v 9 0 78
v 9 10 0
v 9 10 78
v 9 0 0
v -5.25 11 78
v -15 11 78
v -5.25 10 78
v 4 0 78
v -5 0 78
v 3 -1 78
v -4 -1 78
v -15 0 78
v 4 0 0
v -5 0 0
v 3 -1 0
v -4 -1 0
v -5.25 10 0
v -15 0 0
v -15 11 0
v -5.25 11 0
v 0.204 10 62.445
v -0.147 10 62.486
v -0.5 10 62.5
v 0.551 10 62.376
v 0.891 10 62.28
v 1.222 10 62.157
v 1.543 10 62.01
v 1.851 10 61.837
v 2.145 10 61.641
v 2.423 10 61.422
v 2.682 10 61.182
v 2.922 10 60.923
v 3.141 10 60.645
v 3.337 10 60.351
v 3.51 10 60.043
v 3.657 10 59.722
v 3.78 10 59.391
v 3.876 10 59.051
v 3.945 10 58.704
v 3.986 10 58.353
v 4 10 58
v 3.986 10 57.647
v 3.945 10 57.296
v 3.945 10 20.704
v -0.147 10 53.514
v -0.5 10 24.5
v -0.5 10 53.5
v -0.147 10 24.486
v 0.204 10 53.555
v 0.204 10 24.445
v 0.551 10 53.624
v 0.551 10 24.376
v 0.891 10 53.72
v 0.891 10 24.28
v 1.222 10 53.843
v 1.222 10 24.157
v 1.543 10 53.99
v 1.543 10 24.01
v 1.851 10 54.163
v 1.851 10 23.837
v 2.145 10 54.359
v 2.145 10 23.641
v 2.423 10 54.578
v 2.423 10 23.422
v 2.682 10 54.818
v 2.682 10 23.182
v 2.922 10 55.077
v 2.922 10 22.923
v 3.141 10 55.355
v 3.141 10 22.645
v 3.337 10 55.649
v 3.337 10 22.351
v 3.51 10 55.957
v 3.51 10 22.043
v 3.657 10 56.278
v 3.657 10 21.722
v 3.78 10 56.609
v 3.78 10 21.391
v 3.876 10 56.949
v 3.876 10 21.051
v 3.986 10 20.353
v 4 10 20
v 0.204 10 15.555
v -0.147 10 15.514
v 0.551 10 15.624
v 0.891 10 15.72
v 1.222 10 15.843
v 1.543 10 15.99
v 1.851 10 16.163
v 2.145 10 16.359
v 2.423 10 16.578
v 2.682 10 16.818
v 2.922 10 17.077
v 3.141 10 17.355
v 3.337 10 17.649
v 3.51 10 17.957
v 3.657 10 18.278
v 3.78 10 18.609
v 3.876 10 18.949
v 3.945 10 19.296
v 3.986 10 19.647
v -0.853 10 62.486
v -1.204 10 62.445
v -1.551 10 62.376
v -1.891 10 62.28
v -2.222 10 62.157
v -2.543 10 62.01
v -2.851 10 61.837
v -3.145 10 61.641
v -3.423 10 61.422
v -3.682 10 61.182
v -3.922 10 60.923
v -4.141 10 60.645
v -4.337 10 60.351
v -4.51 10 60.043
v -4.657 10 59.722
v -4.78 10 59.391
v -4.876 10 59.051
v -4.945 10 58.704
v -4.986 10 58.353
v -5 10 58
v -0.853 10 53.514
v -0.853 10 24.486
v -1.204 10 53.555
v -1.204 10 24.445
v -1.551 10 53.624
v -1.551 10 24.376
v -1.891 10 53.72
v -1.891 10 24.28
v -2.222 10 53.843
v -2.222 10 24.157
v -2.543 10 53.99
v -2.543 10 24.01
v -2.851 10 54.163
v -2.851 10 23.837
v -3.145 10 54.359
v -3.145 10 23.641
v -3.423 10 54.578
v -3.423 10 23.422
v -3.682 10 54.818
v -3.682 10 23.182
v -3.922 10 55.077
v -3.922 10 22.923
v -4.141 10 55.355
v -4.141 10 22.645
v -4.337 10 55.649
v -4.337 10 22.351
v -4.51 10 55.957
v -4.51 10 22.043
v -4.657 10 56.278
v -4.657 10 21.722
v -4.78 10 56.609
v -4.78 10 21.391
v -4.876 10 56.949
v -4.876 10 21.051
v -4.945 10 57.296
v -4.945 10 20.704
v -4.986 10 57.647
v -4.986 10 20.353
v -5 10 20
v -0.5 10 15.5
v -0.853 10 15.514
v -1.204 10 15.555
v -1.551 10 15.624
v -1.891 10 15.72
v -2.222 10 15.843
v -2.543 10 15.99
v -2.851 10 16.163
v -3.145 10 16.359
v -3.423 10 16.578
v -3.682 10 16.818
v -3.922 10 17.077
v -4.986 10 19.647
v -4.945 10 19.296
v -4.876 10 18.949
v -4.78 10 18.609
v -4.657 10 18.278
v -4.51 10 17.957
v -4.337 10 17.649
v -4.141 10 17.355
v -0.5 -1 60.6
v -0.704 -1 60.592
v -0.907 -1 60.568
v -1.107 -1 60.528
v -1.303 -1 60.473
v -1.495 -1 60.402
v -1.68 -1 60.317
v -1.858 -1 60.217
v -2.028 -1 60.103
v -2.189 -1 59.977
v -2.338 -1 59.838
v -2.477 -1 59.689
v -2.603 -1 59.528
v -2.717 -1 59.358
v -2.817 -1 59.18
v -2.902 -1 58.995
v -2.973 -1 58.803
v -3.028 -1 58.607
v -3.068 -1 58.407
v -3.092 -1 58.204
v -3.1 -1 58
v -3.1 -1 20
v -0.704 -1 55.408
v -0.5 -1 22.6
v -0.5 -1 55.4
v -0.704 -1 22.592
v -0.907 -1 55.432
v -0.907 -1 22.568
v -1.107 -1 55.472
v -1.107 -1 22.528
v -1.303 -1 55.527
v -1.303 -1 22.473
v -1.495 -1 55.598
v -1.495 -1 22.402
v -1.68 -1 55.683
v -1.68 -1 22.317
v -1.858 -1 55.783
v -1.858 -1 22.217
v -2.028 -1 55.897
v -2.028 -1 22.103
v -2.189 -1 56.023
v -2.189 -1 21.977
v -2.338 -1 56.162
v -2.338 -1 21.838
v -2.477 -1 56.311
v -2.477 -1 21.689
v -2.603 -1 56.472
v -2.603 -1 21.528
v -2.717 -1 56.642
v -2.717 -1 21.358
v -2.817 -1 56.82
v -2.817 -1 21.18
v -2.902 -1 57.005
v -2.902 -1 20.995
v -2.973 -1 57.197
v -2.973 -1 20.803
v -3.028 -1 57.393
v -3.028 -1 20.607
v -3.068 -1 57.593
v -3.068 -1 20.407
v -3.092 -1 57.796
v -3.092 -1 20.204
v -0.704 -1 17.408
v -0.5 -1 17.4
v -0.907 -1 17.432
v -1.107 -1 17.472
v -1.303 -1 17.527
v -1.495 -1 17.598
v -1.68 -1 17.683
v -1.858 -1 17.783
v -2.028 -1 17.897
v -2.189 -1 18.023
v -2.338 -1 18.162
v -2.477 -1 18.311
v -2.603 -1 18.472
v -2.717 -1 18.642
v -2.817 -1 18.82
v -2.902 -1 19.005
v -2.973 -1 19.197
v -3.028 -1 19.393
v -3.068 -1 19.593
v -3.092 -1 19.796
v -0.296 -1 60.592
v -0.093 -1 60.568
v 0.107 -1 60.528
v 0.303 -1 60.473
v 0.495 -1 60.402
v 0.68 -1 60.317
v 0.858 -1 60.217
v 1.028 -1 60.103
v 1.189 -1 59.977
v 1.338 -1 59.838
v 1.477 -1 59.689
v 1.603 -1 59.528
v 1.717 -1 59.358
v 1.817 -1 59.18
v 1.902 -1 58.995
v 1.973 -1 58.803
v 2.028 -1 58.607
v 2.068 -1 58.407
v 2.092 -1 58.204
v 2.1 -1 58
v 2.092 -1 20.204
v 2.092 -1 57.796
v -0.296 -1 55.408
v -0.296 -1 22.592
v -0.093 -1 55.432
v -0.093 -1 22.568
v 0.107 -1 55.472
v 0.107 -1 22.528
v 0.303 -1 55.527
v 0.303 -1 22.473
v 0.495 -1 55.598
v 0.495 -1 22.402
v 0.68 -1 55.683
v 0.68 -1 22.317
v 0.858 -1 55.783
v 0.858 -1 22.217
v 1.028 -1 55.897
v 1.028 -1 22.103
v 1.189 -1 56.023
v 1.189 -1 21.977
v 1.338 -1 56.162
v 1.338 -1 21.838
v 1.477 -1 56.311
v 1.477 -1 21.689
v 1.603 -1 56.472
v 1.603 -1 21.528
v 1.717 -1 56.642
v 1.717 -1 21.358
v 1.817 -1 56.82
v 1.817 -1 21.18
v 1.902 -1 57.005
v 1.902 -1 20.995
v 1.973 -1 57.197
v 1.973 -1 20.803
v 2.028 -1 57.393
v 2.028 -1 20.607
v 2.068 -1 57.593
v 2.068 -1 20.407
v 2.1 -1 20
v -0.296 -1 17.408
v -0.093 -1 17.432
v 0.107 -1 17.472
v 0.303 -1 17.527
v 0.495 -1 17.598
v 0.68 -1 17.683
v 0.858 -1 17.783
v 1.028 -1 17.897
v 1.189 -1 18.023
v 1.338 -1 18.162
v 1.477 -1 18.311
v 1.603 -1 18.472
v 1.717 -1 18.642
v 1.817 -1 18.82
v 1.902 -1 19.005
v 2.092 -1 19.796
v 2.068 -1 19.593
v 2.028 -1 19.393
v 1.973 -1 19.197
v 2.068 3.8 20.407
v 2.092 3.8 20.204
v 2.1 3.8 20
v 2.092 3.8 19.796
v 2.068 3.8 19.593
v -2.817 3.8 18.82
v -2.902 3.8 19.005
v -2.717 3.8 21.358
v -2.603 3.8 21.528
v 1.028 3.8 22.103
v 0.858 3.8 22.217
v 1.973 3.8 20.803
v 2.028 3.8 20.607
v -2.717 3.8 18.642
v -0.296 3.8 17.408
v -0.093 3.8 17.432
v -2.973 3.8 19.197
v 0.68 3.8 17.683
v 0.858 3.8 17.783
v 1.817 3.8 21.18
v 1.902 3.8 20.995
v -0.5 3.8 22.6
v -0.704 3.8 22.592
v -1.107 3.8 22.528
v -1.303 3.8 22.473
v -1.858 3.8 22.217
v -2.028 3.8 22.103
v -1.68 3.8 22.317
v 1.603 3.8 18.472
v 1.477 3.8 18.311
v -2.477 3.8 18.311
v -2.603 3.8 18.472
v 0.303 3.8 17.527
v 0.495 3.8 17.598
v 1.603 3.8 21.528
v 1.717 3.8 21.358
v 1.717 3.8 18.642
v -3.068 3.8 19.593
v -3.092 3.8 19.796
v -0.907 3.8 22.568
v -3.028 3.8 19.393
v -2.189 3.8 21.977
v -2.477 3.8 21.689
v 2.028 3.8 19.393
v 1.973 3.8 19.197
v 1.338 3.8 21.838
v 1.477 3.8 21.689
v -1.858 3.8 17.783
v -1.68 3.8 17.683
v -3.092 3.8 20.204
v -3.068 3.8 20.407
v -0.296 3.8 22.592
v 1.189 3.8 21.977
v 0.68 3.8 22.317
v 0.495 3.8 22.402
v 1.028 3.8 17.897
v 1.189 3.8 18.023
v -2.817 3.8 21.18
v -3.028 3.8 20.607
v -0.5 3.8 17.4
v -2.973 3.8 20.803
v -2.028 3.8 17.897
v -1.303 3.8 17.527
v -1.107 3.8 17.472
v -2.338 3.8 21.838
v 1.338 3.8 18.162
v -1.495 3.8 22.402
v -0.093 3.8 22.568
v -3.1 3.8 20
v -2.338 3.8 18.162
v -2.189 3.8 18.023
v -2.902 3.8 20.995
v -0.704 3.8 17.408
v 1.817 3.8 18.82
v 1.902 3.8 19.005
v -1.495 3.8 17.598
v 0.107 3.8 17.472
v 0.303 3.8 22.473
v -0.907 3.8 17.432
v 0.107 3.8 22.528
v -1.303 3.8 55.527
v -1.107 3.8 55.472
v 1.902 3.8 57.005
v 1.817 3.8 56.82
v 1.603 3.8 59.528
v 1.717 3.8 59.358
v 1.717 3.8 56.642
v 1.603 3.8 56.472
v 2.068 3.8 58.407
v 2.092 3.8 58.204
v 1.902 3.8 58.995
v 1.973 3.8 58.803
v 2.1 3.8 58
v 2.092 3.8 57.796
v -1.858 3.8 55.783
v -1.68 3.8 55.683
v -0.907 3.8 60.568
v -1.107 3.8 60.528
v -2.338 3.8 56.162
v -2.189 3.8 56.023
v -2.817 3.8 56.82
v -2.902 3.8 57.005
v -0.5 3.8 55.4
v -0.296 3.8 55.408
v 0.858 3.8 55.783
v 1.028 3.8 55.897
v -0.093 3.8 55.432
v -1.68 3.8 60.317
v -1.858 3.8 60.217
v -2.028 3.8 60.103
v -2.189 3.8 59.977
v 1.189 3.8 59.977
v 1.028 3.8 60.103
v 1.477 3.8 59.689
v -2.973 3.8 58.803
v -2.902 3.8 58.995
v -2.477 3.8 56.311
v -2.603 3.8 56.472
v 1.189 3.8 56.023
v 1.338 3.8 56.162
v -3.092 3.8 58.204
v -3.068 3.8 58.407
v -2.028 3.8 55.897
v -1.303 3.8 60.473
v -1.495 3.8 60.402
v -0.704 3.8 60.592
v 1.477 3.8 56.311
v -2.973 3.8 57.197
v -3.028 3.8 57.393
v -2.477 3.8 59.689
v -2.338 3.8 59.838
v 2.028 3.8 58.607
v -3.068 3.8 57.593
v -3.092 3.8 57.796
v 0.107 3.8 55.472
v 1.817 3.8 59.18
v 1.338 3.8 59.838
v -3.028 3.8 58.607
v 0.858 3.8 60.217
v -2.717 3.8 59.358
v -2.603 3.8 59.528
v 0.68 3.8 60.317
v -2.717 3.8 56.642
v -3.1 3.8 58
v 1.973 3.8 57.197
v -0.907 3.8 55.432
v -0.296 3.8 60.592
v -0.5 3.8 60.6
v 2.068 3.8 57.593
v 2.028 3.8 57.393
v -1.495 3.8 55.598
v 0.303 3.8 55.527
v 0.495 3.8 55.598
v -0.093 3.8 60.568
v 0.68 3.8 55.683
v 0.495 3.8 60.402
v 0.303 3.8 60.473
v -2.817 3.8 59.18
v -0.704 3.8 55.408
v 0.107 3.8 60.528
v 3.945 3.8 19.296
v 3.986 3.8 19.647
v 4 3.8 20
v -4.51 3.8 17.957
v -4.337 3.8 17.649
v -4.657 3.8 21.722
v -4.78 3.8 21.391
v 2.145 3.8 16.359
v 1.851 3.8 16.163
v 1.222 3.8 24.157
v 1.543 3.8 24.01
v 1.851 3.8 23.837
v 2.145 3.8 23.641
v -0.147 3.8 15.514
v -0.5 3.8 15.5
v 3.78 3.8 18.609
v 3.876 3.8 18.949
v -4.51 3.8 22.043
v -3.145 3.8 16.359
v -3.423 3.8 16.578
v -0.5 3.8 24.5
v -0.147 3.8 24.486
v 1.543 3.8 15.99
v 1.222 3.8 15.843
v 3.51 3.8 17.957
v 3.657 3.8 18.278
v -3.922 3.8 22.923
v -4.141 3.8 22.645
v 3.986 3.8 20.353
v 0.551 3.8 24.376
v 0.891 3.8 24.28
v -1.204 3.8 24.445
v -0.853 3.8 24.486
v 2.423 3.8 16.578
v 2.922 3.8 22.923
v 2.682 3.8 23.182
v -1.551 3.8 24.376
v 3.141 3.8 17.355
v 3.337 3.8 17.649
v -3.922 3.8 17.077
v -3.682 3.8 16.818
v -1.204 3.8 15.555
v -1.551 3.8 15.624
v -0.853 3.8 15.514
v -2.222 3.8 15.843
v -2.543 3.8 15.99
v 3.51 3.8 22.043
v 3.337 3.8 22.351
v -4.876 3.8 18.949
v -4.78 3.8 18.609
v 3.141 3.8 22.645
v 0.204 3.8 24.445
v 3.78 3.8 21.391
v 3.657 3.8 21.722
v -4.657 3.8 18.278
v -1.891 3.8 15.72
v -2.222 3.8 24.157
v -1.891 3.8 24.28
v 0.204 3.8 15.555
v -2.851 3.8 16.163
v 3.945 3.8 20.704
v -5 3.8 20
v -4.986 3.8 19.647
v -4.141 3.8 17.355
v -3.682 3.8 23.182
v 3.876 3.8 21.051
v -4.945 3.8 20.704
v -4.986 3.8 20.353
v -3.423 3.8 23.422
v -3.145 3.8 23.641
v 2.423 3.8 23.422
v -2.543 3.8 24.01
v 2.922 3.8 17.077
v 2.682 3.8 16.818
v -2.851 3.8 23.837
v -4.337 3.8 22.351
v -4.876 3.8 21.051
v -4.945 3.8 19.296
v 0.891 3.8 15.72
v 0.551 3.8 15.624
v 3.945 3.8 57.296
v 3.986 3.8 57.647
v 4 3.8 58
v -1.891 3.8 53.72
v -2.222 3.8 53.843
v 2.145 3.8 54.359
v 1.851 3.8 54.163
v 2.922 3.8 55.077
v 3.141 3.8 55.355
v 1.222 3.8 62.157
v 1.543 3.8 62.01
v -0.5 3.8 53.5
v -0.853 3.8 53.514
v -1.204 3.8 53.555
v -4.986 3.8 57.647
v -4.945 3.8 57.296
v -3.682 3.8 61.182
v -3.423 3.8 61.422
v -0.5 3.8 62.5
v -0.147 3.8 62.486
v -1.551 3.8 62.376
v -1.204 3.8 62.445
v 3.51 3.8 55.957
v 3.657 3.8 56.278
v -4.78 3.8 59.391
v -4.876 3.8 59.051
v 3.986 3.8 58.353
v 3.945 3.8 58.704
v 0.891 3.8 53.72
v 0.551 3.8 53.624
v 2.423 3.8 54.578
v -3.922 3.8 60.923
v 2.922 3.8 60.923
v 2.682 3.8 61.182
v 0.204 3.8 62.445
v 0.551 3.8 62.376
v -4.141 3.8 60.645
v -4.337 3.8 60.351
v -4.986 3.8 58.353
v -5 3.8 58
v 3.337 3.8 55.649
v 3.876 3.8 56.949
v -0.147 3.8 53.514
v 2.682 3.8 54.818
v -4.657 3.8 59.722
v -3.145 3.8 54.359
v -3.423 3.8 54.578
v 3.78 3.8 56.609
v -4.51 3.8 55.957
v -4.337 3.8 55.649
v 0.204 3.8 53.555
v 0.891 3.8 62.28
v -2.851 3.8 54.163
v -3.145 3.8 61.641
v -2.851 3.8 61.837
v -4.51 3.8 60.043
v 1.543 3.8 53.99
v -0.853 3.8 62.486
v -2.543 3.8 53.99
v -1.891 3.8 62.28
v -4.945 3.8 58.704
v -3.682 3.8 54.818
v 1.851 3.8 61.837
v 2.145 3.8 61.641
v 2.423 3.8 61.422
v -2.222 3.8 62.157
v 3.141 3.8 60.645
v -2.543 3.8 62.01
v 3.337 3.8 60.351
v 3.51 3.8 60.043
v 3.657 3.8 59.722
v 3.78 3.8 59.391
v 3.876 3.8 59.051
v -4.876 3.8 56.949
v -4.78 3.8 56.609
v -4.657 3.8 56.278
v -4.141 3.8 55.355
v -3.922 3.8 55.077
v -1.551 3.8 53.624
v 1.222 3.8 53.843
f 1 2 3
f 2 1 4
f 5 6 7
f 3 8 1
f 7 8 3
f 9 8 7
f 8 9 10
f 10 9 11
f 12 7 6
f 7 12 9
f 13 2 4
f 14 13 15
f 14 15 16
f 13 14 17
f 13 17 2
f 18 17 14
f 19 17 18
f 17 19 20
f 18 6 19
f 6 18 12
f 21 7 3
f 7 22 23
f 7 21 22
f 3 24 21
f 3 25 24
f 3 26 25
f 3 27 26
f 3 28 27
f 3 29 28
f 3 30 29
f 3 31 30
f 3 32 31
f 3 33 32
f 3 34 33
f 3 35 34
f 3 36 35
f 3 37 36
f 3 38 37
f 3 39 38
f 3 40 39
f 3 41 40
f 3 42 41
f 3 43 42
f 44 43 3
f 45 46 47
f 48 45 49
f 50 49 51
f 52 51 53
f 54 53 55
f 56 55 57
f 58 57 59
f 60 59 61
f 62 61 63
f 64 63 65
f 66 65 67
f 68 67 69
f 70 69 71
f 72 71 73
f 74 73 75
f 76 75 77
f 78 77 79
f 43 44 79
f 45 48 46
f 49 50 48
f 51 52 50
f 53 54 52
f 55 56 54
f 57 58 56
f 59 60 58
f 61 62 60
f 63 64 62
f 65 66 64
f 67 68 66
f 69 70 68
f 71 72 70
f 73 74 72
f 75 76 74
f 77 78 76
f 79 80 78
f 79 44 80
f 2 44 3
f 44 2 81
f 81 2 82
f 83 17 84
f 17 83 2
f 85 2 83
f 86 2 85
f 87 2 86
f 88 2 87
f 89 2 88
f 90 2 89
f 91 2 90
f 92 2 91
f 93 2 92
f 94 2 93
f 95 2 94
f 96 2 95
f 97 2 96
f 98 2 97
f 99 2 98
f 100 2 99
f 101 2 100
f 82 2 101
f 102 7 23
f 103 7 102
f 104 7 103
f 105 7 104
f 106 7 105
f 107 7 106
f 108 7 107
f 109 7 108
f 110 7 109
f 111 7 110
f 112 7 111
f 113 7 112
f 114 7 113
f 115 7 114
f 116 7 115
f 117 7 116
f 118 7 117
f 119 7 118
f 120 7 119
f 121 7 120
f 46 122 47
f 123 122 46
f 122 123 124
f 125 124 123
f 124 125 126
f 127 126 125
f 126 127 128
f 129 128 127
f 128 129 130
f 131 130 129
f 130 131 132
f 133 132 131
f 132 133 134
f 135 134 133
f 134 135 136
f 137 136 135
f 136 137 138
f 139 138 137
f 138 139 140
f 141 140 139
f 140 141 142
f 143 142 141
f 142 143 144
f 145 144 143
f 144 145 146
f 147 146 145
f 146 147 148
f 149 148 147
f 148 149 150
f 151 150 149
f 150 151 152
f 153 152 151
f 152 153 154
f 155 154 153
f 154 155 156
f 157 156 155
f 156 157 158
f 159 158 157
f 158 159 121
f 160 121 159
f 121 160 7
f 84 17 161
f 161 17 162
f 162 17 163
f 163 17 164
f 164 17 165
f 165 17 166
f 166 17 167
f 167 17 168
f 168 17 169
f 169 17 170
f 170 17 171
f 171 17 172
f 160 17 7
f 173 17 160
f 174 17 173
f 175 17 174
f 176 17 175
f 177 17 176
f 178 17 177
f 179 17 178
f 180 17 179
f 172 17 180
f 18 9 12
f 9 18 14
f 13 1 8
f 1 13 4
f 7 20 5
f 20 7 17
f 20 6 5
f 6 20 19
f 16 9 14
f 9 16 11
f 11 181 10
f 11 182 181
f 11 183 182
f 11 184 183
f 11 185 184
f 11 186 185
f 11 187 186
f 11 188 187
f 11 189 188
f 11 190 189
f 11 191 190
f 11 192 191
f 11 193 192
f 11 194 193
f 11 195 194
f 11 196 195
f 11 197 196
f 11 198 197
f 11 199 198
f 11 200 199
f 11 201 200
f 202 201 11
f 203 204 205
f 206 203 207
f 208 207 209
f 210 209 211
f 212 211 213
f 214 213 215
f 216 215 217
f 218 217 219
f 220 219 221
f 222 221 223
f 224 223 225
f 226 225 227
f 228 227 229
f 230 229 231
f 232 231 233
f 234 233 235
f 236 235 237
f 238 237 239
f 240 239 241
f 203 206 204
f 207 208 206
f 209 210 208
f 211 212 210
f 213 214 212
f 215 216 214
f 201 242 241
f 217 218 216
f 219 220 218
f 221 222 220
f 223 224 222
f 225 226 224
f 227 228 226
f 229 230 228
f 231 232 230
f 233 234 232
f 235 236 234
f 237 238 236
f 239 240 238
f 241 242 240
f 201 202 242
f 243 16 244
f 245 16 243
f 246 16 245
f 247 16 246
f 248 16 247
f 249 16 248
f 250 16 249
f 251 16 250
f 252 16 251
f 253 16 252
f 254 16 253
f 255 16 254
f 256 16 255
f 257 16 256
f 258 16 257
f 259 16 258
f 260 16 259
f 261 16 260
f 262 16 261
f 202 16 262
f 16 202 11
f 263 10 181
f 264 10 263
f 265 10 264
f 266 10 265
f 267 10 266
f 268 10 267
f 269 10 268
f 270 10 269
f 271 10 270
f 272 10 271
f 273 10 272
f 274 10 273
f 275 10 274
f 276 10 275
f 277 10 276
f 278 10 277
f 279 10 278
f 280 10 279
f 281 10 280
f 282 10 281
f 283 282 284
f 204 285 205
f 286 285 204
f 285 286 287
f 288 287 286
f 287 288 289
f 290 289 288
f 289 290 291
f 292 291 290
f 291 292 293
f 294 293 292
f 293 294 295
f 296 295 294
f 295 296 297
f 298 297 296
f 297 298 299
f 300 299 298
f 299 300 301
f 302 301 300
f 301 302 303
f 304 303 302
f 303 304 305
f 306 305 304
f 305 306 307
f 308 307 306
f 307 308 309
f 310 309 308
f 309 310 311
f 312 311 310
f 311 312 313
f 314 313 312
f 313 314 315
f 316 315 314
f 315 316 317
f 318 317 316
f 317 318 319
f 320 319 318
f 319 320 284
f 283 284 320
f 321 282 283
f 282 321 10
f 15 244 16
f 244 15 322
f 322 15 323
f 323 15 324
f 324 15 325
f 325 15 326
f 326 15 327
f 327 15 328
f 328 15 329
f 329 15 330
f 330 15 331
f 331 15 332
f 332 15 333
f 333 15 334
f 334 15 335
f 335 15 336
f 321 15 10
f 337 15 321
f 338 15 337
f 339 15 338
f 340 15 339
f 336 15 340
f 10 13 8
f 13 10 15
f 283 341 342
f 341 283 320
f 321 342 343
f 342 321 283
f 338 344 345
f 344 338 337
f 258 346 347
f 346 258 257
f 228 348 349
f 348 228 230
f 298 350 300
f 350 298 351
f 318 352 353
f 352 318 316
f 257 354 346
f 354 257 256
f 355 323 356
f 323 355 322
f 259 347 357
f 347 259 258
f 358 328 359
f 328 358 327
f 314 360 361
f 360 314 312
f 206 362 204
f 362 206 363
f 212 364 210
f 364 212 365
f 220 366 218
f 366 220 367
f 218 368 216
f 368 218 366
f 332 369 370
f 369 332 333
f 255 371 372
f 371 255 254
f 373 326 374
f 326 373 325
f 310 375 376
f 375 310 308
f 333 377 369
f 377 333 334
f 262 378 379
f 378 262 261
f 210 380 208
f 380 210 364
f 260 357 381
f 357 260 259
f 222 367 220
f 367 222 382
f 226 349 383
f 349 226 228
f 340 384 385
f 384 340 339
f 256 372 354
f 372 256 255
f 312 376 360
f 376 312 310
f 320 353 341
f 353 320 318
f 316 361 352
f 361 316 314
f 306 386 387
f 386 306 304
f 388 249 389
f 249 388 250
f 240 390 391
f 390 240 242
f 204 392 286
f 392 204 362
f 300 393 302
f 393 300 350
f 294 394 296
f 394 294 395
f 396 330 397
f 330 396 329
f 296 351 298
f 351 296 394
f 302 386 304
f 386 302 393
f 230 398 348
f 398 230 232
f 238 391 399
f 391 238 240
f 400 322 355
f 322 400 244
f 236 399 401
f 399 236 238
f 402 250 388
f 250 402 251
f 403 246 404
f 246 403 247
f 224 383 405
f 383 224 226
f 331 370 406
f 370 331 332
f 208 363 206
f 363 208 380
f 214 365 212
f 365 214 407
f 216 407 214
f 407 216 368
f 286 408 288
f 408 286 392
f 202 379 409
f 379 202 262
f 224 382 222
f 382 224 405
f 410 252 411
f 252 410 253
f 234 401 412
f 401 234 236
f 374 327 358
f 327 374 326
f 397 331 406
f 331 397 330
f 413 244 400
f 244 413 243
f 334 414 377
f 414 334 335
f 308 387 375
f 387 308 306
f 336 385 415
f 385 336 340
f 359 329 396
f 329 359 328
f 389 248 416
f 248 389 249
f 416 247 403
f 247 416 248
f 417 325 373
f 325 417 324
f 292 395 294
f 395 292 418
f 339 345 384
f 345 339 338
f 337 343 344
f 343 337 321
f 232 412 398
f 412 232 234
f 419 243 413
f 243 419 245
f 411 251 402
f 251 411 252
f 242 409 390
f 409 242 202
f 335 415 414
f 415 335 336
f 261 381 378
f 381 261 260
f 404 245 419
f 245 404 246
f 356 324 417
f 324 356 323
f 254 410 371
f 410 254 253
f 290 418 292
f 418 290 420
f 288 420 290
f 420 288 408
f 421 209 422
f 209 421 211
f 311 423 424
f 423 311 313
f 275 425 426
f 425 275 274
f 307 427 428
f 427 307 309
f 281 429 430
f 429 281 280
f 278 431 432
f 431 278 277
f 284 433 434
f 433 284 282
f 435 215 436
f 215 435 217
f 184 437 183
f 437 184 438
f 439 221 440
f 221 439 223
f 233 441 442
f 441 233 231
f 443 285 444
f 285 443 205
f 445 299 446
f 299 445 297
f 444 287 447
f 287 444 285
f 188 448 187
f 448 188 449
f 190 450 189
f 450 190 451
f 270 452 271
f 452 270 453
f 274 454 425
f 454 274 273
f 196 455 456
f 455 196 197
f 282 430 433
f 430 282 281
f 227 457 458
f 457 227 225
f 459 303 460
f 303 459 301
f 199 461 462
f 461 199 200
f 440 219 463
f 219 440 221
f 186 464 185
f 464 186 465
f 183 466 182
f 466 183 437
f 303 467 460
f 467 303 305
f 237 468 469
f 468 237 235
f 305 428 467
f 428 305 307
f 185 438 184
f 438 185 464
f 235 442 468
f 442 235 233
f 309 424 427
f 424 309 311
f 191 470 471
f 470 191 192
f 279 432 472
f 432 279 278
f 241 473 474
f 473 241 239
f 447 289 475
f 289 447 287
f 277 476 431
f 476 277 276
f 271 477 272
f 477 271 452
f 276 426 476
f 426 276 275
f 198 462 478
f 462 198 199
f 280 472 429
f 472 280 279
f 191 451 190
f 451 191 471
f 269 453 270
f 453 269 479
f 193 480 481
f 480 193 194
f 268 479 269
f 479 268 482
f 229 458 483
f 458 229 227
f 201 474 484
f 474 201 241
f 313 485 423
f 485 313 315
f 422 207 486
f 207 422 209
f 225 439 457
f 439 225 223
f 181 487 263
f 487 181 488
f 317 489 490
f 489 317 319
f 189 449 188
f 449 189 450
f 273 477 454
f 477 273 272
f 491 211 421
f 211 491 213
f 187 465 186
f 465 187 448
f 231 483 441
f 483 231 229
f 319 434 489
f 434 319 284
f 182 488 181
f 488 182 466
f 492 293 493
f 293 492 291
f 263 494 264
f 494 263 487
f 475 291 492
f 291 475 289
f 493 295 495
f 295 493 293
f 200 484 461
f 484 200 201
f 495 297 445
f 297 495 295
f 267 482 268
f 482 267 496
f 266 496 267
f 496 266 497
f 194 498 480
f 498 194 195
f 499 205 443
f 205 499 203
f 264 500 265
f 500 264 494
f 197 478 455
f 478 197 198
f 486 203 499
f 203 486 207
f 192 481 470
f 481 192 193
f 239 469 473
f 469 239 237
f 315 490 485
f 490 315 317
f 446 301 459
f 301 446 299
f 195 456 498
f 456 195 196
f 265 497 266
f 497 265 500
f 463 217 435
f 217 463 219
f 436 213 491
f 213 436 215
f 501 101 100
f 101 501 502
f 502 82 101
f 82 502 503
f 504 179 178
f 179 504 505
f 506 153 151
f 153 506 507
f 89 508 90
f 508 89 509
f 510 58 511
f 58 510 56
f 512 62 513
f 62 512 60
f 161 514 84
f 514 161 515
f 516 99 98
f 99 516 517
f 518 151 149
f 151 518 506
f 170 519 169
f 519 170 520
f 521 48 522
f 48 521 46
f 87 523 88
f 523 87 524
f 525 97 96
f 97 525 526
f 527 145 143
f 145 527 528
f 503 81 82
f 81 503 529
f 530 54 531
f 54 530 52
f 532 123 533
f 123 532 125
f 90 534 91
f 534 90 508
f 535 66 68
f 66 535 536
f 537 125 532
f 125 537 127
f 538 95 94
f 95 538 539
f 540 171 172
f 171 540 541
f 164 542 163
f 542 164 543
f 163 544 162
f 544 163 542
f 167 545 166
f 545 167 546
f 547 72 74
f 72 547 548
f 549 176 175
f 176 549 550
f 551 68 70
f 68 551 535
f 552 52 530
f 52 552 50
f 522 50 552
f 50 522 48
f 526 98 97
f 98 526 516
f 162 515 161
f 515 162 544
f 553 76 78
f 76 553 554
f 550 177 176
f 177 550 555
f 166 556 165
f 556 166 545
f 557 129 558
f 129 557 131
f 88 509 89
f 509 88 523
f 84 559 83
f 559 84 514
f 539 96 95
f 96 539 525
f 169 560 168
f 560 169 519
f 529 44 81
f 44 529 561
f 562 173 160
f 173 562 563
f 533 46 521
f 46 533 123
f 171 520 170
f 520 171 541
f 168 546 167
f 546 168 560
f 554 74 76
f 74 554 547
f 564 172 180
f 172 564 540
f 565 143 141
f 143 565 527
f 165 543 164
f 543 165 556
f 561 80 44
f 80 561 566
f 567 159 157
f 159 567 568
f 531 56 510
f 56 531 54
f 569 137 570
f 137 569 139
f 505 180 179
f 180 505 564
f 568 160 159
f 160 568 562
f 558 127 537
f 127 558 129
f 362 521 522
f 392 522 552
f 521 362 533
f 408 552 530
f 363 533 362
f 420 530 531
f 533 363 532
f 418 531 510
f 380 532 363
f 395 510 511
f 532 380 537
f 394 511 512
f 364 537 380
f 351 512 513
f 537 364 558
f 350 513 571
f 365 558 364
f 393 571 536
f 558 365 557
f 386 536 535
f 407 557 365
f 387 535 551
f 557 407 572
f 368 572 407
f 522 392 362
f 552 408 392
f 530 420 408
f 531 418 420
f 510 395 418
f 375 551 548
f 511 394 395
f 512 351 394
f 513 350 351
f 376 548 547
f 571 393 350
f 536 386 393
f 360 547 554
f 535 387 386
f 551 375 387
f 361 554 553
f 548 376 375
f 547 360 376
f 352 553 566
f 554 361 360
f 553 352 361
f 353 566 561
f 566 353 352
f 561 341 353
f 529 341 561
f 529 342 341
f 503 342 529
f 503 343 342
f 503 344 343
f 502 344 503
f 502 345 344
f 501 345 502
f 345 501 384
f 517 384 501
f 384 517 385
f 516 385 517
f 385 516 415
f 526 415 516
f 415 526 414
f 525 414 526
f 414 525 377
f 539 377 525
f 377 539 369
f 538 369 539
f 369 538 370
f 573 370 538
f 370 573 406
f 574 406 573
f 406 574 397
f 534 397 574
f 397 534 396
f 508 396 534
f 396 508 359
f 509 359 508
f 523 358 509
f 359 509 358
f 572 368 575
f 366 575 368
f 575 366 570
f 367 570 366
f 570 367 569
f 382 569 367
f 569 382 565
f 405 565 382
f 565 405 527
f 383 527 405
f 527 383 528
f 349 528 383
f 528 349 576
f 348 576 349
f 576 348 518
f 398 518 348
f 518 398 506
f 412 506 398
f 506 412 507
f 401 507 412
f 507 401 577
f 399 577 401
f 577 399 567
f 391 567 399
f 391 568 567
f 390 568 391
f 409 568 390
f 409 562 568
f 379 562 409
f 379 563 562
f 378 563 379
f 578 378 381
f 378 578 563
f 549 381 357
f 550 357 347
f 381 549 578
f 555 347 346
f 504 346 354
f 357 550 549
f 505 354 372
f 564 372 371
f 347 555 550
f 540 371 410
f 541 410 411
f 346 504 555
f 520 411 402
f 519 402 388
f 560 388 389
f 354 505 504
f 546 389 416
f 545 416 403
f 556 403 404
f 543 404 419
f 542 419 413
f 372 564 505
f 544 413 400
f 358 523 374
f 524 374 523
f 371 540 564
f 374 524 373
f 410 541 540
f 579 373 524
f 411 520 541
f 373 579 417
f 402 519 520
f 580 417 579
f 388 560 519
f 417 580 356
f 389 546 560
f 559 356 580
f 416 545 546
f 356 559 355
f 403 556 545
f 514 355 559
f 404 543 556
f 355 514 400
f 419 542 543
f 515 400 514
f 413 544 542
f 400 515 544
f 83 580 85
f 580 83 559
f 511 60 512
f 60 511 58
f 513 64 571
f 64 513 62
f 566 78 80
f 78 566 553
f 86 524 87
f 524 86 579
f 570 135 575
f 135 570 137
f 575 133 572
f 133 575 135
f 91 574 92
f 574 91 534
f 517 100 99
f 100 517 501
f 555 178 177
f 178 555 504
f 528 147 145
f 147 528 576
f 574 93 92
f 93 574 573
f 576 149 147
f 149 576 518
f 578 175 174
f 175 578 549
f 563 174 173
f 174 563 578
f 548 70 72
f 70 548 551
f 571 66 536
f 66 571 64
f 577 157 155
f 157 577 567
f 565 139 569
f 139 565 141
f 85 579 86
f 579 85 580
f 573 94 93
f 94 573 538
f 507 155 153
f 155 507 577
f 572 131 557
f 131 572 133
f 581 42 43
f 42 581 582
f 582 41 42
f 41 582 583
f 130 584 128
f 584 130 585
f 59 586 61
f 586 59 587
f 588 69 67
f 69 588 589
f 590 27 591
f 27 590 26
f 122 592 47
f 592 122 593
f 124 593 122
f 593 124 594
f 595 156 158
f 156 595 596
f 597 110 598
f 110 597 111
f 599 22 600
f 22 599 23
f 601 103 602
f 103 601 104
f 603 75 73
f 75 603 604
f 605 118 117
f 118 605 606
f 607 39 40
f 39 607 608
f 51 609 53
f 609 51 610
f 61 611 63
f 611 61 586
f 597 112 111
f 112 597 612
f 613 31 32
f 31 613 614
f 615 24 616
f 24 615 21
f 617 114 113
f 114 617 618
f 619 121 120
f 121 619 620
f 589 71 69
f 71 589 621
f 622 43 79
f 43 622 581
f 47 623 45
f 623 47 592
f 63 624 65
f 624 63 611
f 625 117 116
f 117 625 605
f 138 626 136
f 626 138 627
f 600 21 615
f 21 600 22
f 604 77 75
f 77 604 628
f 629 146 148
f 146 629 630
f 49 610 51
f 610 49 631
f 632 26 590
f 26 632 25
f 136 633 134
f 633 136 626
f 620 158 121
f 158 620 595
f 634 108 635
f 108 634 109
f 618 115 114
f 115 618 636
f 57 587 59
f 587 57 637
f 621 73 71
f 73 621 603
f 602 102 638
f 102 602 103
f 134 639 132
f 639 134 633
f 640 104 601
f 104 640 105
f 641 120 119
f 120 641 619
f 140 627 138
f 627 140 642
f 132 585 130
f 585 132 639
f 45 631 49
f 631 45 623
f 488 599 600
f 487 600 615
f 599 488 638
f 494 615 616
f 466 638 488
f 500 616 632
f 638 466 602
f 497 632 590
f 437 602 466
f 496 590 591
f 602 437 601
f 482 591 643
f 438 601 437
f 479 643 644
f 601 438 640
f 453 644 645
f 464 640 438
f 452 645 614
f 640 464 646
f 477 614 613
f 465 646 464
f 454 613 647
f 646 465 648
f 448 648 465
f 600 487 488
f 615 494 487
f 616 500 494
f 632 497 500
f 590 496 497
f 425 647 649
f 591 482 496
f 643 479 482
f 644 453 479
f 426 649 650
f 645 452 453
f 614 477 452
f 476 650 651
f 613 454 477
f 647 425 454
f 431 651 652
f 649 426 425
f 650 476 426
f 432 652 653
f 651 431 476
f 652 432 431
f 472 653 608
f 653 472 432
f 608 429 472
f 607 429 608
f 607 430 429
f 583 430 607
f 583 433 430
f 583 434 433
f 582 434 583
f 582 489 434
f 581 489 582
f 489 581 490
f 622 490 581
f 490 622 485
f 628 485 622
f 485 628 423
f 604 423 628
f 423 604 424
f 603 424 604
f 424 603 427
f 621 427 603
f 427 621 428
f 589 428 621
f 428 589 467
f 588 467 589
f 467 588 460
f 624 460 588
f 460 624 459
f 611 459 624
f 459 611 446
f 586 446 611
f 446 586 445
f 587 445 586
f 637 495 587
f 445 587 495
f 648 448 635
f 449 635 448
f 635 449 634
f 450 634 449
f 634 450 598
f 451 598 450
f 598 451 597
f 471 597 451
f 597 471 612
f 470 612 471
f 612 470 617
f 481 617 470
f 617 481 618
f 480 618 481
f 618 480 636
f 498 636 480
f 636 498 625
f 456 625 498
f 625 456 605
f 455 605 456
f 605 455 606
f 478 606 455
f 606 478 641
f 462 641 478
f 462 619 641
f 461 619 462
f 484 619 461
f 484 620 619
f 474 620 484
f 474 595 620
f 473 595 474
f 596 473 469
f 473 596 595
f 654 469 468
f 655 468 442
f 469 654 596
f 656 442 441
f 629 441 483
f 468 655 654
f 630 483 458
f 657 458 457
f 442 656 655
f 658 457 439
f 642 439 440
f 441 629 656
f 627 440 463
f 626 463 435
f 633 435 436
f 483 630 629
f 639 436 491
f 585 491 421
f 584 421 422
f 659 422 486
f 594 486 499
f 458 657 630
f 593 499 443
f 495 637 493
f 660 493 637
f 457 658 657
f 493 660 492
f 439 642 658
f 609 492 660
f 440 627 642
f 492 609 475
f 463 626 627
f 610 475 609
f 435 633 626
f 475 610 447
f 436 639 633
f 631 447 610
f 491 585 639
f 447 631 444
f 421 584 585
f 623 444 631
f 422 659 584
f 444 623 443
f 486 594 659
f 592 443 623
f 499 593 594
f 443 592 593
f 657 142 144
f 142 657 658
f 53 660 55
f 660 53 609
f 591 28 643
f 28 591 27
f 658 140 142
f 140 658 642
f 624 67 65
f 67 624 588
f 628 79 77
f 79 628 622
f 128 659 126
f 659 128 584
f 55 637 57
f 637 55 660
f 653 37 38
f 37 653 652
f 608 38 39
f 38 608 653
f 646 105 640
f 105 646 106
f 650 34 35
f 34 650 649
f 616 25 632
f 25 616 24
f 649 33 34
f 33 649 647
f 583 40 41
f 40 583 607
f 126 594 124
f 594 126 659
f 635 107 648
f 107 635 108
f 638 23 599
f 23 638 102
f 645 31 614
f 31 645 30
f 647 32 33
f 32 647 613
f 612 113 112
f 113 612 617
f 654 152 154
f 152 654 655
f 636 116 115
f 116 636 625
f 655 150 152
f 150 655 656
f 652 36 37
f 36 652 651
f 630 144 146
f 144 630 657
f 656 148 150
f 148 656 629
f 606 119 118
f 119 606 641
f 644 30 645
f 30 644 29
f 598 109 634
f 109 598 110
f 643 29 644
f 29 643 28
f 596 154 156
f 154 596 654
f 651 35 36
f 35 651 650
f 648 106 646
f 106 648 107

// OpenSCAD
$fn=80;

// 4.8 mm deep hole for using an 8mm bolt

difference() {
   union() {
      translate([-15,0,0]) cube([24,10,78]);
      translate([-15,0,0]) cube([9.75,11,78]);
      translate([4,0,0]) rotate([0,0,180])
         linear_extrude(height=78)
         polygon(points=[[-0.1,0],[0,0],[1,1],[8,1],[9,0],[9,-0.1]]);
   }

   bolts();
}

module bolts() {
   union() {
         /* bolt holes */
         translate([-0.5,12,20]) rotate([90,0,0]) cylinder(h=15,d=5.2);
         translate([-0.5,12,58]) rotate([90,0,0]) cylinder(h=15,d=5.2);
   
         /* cap holes (with a little gap to allow bridging */
         translate([-0.5,3.8,20]) rotate([-90,0,0]) cylinder(h=30,d=9);
         translate([-0.5,3.8,58]) rotate([-90,0,0]) cylinder(h=30,d=9);
   }
}
